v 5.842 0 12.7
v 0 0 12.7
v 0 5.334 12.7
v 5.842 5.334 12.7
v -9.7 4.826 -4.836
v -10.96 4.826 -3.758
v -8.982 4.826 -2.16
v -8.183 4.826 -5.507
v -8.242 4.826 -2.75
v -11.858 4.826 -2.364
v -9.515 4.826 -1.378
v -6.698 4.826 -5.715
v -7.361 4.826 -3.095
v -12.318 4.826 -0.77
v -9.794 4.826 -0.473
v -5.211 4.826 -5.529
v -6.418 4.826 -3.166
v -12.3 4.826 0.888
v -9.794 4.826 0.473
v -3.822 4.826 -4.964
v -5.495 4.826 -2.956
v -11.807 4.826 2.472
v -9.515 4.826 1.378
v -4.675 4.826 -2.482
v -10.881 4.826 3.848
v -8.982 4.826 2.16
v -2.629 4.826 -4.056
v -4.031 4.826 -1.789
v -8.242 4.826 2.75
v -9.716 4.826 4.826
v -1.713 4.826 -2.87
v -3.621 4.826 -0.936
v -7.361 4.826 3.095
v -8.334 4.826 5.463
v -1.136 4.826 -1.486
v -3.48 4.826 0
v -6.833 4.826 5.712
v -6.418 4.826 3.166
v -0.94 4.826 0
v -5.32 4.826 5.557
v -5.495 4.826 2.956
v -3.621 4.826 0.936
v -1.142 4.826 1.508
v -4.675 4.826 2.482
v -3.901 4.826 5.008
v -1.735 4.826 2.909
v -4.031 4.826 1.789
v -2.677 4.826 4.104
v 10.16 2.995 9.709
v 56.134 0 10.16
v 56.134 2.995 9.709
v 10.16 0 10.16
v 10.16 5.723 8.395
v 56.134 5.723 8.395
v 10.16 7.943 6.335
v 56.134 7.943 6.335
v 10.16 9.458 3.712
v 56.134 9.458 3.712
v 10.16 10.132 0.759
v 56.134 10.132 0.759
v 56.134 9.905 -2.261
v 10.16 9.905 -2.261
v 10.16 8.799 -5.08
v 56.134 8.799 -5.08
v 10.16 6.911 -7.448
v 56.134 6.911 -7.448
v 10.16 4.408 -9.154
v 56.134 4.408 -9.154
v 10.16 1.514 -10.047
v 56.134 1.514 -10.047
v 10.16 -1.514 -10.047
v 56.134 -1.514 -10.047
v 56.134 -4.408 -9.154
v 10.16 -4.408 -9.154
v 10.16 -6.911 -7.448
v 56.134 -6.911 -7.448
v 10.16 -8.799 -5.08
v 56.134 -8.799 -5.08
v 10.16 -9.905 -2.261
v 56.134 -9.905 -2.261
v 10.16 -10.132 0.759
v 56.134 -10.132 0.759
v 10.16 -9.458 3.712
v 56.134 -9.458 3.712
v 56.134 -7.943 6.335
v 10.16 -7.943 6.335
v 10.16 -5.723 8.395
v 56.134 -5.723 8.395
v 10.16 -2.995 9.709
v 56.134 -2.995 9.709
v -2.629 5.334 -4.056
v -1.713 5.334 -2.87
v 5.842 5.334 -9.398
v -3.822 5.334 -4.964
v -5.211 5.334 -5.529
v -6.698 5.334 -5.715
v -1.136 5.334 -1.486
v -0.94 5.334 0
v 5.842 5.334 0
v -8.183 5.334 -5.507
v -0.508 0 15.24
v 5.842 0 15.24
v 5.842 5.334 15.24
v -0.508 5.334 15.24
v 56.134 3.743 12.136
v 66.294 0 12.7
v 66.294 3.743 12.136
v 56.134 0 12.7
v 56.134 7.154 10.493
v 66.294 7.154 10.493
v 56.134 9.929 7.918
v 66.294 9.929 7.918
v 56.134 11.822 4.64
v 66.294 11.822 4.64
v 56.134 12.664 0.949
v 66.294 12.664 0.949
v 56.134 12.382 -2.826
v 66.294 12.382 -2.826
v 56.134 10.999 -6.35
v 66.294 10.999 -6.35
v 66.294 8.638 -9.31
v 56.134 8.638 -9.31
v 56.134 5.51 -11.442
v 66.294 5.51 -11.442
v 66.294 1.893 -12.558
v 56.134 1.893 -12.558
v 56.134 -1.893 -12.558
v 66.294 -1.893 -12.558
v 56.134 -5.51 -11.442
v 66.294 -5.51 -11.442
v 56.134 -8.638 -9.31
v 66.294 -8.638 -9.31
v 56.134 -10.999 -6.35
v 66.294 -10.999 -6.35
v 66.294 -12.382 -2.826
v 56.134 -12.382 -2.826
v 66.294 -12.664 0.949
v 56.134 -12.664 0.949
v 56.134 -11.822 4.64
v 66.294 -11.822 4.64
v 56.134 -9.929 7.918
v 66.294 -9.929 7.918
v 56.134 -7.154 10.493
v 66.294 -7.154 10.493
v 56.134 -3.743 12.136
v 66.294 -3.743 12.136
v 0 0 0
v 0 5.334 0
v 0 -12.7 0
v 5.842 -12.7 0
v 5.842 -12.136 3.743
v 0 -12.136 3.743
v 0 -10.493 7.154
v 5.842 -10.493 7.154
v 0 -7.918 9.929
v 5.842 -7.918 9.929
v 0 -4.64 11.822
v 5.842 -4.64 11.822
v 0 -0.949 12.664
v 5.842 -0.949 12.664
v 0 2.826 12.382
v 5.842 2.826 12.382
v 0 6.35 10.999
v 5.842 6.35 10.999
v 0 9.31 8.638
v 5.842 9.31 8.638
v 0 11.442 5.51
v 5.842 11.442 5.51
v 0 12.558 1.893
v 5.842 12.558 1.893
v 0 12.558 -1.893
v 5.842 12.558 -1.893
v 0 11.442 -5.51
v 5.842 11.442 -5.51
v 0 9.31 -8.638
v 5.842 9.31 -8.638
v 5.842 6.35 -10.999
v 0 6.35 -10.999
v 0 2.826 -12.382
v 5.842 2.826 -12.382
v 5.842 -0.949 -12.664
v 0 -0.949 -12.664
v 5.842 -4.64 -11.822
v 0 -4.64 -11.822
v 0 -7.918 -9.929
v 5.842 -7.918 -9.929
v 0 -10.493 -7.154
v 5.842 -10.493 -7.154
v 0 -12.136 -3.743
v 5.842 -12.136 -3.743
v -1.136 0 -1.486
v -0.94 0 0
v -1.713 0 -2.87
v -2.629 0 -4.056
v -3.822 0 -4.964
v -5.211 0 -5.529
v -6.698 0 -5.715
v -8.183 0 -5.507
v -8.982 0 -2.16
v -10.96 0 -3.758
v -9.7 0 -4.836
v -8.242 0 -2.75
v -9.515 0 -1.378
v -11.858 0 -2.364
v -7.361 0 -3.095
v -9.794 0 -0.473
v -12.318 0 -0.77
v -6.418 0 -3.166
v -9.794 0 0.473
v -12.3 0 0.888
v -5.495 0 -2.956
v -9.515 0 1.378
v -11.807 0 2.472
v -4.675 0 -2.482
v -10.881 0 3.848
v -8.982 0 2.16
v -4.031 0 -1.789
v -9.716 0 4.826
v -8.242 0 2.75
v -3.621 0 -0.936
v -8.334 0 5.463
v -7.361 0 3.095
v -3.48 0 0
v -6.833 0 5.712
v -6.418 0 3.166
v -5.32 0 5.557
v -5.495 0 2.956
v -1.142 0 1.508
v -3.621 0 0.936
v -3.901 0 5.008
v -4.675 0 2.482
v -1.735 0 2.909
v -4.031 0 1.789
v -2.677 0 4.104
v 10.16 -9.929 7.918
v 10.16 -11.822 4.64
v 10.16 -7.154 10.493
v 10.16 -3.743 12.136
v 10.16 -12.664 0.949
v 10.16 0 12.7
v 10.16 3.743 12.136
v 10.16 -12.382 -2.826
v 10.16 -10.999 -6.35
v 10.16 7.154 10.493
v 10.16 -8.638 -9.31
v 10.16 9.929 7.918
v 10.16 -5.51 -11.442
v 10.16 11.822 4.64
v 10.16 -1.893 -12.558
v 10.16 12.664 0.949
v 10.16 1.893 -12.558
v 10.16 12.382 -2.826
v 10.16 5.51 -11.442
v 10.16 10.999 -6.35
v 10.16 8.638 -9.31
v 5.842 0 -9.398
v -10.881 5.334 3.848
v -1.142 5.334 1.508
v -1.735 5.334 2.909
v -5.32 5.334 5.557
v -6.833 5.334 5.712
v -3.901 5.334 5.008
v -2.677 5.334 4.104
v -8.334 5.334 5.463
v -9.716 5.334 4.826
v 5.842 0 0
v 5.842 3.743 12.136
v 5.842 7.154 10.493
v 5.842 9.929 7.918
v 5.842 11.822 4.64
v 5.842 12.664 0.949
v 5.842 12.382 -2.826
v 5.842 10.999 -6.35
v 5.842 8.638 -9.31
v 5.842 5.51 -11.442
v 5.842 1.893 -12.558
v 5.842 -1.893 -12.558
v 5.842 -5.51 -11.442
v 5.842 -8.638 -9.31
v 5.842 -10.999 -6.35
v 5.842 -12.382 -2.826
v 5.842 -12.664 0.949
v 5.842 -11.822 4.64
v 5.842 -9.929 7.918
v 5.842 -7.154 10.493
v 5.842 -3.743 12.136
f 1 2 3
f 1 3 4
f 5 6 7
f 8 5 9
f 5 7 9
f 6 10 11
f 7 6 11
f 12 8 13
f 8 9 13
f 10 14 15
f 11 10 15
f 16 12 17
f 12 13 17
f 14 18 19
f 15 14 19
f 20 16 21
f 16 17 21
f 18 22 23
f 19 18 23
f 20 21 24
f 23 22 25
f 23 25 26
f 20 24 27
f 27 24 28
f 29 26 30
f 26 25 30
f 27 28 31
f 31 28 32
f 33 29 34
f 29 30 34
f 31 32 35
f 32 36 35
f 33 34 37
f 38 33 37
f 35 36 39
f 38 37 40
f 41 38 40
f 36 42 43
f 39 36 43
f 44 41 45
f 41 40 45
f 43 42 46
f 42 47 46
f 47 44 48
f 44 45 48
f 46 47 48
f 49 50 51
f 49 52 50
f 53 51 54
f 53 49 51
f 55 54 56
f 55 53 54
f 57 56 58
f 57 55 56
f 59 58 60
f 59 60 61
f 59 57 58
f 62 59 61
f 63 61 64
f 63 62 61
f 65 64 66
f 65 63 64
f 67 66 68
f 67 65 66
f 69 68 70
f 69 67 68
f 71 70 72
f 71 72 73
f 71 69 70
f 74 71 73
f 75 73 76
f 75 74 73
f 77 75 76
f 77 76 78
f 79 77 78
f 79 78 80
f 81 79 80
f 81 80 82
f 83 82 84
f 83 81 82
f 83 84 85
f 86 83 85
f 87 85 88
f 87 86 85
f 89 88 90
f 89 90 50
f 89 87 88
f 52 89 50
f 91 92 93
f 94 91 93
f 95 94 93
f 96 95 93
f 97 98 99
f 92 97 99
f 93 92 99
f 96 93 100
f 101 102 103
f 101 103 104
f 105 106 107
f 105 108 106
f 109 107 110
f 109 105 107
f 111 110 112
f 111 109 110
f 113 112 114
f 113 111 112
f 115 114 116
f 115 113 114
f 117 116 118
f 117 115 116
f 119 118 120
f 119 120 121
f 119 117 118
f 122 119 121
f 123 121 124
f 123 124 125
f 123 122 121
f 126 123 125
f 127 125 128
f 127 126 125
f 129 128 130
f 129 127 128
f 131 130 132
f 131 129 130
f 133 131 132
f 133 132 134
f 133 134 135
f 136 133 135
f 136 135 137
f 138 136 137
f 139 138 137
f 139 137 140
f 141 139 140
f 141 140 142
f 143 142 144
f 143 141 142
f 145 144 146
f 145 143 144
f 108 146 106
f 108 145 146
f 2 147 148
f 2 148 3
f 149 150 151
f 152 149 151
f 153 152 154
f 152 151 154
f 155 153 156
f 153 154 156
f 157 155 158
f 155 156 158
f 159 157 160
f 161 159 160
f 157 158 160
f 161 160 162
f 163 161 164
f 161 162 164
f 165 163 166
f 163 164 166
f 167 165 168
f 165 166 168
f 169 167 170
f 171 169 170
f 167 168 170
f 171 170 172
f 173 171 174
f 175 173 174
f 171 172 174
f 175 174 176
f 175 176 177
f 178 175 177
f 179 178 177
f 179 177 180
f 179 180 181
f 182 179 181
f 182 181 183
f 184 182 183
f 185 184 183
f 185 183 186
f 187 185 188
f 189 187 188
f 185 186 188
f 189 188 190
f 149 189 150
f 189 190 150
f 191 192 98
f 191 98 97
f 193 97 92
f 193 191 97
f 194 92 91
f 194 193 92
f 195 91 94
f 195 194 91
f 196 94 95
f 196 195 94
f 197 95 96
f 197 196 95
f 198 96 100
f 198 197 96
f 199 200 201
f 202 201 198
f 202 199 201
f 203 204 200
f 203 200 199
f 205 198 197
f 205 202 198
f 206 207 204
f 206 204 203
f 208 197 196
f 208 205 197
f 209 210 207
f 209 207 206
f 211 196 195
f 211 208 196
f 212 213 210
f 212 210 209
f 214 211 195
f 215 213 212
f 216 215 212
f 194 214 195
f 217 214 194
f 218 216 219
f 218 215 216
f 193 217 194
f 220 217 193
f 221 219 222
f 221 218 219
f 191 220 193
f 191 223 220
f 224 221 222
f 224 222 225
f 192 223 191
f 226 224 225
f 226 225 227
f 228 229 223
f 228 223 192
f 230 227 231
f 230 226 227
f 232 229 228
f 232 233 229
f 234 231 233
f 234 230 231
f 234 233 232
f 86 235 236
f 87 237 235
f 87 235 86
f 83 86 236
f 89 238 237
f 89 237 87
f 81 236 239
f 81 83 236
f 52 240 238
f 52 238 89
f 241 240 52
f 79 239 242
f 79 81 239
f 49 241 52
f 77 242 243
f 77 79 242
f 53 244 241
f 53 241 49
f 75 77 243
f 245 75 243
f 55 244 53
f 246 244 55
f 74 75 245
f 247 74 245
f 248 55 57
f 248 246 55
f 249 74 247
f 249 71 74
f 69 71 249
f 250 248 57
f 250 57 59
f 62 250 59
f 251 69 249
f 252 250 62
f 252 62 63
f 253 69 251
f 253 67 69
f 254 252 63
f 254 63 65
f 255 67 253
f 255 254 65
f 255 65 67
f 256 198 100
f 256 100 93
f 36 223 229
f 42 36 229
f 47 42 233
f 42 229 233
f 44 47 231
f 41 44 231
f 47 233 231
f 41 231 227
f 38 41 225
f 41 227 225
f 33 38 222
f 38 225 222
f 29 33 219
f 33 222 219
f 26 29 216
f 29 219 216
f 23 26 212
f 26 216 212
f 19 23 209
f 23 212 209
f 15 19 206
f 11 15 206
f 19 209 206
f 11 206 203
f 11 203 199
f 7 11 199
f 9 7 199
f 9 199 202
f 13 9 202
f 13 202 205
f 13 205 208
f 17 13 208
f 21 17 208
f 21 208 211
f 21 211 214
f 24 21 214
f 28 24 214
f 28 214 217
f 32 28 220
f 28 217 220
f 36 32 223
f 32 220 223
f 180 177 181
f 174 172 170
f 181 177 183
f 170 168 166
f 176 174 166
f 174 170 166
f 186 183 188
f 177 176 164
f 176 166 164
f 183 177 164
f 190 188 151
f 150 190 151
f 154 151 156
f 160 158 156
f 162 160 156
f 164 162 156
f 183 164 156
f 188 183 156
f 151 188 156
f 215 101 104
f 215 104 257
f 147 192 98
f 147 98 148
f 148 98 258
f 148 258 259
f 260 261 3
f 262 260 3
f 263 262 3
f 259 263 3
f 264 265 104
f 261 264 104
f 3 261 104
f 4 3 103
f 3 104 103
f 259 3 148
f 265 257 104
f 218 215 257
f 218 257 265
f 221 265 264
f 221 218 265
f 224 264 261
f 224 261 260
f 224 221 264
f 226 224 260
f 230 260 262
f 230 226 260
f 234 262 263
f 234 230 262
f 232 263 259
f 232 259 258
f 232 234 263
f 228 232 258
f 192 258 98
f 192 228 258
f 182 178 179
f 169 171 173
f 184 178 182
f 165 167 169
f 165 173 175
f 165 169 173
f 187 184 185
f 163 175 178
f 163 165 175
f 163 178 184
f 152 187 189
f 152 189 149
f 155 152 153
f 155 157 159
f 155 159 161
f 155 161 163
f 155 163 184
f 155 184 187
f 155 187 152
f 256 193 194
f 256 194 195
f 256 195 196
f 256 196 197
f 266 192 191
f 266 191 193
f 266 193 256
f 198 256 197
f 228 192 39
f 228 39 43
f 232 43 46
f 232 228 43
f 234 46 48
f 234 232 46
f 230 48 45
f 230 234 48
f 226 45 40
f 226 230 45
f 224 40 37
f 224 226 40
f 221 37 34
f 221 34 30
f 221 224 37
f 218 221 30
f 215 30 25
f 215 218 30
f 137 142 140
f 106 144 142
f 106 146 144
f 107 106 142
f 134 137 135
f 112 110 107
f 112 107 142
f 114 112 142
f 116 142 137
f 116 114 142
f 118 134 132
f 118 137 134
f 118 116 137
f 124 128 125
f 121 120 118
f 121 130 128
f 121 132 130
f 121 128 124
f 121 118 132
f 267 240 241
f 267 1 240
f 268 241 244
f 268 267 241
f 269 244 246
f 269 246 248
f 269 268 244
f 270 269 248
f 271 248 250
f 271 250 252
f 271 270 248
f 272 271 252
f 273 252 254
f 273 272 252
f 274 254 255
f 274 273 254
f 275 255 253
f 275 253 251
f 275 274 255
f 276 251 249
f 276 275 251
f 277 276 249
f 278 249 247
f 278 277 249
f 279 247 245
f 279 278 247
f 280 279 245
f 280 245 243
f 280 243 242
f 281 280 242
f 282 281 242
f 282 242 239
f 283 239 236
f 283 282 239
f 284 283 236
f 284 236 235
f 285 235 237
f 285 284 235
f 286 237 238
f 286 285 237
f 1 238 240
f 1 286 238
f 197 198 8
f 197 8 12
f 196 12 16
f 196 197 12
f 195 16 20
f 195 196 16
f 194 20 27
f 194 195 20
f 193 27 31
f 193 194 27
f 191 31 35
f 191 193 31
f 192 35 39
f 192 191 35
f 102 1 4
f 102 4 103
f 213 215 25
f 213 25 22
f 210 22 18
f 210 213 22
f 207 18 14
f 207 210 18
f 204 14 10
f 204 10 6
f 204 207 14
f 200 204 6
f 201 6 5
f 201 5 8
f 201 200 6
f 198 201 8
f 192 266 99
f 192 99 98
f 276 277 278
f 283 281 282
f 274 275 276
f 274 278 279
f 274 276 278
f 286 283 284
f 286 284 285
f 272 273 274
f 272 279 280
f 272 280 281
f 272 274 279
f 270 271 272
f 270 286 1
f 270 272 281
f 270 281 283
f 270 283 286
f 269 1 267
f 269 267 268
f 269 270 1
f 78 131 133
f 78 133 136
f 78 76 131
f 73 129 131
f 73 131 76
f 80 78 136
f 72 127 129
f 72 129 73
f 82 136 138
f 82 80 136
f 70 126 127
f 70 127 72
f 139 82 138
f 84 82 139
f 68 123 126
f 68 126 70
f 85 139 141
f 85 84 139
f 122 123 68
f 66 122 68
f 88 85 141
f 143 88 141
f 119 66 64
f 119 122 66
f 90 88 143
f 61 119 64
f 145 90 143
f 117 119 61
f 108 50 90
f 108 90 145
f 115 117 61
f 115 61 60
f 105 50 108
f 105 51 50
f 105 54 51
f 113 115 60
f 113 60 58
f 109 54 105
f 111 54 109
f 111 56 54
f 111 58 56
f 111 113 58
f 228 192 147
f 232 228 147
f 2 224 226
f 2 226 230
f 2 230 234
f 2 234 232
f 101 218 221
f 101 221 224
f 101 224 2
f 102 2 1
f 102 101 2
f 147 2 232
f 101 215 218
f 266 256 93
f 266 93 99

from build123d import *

# Parameters (mm, degrees)
F2_DEPTH  = 5.334
F1_FACE_R = 12.7
F3_DEPTH  = 5.842
F4_DEPTH  = 5.334
F0_R      = 3.175
F5_DEPTH  = 4.826


with BuildPart() as f1:
    # F0 (on Front) → F1 (revolve)
    with BuildSketch(Plane.XZ):
        Polygon((5.842, 12.7), (5.842, 0), (66.294, 0), (66.294, 12.7), (56.134, 12.7), (56.134, 10.16), (10.16, 10.16), (10.16, 12.7), align=None)
    revolve(axis=Axis((33.147, 0, 0), (-1, 0, 0)))


with BuildPart() as f2:
    # F0 (on Front) → F2 (new body)
    with BuildSketch(Plane.XZ):
        with BuildLine():
            Line((-0.9398, 0), (0, 0))
            Line((0, 0), (0, 12.7))
            Line((0, 12.7), (5.842, 12.7))
            Line((5.842, 12.7), (5.842, 15.24))
            Line((5.842, 15.24), (-0.508, 15.24))
            Line((-0.508, 15.24), (-10.88063, 3.847543))
            ThreePointArc((-10.88063, 3.847543), (-4.591961, 5.329721), (-0.9398, 0))
        make_face()
    extrude(amount=-F2_DEPTH)


with BuildPart() as f3:
    # F1_face (on face) → F3 (new body)
    with BuildSketch(Plane(origin=(5.842, 0, 0), x_dir=(0, -1, 0), z_dir=(-1, 0, 0))):
        Circle(F1_FACE_R)
    extrude(amount=F3_DEPTH)


with BuildPart() as f4:
    # F0 (on Front) → F4 (new body)
    with BuildSketch(Plane.XZ):
        with BuildLine():
            Line((5.842, 0), (0, 0))
            Line((0, 0), (-0.9398, 0))
            ThreePointArc((-0.9398, 0), (-3.195791, -4.549339), (-8.182663, -5.506983))
            Line((-8.182663, -5.506983), (5.842, -9.398))
            Line((5.842, -9.398), (5.842, 0))
        make_face()
    extrude(amount=-F4_DEPTH)


with BuildPart() as f5:
    # F0 (on Front) → F5 (new body)
    with BuildSketch(Plane.XZ):
        with BuildLine():
            ThreePointArc((-8.182663, -5.506983), (-3.195791, -4.549339), (-0.9398, 0))
            ThreePointArc((-0.9398, 0), (-4.591961, 5.329721), (-10.88063, 3.847543))
            ThreePointArc((-10.88063, 3.847543), (-12.145978, -1.583727), (-8.182663, -5.506983))
        make_face()
        with Locations((-6.6548, 0)):
            Circle(F0_R, mode=Mode.SUBTRACT)
    extrude(amount=-F5_DEPTH)


solid = Compound([f1.part, f2.part, f3.part, f4.part, f5.part])
